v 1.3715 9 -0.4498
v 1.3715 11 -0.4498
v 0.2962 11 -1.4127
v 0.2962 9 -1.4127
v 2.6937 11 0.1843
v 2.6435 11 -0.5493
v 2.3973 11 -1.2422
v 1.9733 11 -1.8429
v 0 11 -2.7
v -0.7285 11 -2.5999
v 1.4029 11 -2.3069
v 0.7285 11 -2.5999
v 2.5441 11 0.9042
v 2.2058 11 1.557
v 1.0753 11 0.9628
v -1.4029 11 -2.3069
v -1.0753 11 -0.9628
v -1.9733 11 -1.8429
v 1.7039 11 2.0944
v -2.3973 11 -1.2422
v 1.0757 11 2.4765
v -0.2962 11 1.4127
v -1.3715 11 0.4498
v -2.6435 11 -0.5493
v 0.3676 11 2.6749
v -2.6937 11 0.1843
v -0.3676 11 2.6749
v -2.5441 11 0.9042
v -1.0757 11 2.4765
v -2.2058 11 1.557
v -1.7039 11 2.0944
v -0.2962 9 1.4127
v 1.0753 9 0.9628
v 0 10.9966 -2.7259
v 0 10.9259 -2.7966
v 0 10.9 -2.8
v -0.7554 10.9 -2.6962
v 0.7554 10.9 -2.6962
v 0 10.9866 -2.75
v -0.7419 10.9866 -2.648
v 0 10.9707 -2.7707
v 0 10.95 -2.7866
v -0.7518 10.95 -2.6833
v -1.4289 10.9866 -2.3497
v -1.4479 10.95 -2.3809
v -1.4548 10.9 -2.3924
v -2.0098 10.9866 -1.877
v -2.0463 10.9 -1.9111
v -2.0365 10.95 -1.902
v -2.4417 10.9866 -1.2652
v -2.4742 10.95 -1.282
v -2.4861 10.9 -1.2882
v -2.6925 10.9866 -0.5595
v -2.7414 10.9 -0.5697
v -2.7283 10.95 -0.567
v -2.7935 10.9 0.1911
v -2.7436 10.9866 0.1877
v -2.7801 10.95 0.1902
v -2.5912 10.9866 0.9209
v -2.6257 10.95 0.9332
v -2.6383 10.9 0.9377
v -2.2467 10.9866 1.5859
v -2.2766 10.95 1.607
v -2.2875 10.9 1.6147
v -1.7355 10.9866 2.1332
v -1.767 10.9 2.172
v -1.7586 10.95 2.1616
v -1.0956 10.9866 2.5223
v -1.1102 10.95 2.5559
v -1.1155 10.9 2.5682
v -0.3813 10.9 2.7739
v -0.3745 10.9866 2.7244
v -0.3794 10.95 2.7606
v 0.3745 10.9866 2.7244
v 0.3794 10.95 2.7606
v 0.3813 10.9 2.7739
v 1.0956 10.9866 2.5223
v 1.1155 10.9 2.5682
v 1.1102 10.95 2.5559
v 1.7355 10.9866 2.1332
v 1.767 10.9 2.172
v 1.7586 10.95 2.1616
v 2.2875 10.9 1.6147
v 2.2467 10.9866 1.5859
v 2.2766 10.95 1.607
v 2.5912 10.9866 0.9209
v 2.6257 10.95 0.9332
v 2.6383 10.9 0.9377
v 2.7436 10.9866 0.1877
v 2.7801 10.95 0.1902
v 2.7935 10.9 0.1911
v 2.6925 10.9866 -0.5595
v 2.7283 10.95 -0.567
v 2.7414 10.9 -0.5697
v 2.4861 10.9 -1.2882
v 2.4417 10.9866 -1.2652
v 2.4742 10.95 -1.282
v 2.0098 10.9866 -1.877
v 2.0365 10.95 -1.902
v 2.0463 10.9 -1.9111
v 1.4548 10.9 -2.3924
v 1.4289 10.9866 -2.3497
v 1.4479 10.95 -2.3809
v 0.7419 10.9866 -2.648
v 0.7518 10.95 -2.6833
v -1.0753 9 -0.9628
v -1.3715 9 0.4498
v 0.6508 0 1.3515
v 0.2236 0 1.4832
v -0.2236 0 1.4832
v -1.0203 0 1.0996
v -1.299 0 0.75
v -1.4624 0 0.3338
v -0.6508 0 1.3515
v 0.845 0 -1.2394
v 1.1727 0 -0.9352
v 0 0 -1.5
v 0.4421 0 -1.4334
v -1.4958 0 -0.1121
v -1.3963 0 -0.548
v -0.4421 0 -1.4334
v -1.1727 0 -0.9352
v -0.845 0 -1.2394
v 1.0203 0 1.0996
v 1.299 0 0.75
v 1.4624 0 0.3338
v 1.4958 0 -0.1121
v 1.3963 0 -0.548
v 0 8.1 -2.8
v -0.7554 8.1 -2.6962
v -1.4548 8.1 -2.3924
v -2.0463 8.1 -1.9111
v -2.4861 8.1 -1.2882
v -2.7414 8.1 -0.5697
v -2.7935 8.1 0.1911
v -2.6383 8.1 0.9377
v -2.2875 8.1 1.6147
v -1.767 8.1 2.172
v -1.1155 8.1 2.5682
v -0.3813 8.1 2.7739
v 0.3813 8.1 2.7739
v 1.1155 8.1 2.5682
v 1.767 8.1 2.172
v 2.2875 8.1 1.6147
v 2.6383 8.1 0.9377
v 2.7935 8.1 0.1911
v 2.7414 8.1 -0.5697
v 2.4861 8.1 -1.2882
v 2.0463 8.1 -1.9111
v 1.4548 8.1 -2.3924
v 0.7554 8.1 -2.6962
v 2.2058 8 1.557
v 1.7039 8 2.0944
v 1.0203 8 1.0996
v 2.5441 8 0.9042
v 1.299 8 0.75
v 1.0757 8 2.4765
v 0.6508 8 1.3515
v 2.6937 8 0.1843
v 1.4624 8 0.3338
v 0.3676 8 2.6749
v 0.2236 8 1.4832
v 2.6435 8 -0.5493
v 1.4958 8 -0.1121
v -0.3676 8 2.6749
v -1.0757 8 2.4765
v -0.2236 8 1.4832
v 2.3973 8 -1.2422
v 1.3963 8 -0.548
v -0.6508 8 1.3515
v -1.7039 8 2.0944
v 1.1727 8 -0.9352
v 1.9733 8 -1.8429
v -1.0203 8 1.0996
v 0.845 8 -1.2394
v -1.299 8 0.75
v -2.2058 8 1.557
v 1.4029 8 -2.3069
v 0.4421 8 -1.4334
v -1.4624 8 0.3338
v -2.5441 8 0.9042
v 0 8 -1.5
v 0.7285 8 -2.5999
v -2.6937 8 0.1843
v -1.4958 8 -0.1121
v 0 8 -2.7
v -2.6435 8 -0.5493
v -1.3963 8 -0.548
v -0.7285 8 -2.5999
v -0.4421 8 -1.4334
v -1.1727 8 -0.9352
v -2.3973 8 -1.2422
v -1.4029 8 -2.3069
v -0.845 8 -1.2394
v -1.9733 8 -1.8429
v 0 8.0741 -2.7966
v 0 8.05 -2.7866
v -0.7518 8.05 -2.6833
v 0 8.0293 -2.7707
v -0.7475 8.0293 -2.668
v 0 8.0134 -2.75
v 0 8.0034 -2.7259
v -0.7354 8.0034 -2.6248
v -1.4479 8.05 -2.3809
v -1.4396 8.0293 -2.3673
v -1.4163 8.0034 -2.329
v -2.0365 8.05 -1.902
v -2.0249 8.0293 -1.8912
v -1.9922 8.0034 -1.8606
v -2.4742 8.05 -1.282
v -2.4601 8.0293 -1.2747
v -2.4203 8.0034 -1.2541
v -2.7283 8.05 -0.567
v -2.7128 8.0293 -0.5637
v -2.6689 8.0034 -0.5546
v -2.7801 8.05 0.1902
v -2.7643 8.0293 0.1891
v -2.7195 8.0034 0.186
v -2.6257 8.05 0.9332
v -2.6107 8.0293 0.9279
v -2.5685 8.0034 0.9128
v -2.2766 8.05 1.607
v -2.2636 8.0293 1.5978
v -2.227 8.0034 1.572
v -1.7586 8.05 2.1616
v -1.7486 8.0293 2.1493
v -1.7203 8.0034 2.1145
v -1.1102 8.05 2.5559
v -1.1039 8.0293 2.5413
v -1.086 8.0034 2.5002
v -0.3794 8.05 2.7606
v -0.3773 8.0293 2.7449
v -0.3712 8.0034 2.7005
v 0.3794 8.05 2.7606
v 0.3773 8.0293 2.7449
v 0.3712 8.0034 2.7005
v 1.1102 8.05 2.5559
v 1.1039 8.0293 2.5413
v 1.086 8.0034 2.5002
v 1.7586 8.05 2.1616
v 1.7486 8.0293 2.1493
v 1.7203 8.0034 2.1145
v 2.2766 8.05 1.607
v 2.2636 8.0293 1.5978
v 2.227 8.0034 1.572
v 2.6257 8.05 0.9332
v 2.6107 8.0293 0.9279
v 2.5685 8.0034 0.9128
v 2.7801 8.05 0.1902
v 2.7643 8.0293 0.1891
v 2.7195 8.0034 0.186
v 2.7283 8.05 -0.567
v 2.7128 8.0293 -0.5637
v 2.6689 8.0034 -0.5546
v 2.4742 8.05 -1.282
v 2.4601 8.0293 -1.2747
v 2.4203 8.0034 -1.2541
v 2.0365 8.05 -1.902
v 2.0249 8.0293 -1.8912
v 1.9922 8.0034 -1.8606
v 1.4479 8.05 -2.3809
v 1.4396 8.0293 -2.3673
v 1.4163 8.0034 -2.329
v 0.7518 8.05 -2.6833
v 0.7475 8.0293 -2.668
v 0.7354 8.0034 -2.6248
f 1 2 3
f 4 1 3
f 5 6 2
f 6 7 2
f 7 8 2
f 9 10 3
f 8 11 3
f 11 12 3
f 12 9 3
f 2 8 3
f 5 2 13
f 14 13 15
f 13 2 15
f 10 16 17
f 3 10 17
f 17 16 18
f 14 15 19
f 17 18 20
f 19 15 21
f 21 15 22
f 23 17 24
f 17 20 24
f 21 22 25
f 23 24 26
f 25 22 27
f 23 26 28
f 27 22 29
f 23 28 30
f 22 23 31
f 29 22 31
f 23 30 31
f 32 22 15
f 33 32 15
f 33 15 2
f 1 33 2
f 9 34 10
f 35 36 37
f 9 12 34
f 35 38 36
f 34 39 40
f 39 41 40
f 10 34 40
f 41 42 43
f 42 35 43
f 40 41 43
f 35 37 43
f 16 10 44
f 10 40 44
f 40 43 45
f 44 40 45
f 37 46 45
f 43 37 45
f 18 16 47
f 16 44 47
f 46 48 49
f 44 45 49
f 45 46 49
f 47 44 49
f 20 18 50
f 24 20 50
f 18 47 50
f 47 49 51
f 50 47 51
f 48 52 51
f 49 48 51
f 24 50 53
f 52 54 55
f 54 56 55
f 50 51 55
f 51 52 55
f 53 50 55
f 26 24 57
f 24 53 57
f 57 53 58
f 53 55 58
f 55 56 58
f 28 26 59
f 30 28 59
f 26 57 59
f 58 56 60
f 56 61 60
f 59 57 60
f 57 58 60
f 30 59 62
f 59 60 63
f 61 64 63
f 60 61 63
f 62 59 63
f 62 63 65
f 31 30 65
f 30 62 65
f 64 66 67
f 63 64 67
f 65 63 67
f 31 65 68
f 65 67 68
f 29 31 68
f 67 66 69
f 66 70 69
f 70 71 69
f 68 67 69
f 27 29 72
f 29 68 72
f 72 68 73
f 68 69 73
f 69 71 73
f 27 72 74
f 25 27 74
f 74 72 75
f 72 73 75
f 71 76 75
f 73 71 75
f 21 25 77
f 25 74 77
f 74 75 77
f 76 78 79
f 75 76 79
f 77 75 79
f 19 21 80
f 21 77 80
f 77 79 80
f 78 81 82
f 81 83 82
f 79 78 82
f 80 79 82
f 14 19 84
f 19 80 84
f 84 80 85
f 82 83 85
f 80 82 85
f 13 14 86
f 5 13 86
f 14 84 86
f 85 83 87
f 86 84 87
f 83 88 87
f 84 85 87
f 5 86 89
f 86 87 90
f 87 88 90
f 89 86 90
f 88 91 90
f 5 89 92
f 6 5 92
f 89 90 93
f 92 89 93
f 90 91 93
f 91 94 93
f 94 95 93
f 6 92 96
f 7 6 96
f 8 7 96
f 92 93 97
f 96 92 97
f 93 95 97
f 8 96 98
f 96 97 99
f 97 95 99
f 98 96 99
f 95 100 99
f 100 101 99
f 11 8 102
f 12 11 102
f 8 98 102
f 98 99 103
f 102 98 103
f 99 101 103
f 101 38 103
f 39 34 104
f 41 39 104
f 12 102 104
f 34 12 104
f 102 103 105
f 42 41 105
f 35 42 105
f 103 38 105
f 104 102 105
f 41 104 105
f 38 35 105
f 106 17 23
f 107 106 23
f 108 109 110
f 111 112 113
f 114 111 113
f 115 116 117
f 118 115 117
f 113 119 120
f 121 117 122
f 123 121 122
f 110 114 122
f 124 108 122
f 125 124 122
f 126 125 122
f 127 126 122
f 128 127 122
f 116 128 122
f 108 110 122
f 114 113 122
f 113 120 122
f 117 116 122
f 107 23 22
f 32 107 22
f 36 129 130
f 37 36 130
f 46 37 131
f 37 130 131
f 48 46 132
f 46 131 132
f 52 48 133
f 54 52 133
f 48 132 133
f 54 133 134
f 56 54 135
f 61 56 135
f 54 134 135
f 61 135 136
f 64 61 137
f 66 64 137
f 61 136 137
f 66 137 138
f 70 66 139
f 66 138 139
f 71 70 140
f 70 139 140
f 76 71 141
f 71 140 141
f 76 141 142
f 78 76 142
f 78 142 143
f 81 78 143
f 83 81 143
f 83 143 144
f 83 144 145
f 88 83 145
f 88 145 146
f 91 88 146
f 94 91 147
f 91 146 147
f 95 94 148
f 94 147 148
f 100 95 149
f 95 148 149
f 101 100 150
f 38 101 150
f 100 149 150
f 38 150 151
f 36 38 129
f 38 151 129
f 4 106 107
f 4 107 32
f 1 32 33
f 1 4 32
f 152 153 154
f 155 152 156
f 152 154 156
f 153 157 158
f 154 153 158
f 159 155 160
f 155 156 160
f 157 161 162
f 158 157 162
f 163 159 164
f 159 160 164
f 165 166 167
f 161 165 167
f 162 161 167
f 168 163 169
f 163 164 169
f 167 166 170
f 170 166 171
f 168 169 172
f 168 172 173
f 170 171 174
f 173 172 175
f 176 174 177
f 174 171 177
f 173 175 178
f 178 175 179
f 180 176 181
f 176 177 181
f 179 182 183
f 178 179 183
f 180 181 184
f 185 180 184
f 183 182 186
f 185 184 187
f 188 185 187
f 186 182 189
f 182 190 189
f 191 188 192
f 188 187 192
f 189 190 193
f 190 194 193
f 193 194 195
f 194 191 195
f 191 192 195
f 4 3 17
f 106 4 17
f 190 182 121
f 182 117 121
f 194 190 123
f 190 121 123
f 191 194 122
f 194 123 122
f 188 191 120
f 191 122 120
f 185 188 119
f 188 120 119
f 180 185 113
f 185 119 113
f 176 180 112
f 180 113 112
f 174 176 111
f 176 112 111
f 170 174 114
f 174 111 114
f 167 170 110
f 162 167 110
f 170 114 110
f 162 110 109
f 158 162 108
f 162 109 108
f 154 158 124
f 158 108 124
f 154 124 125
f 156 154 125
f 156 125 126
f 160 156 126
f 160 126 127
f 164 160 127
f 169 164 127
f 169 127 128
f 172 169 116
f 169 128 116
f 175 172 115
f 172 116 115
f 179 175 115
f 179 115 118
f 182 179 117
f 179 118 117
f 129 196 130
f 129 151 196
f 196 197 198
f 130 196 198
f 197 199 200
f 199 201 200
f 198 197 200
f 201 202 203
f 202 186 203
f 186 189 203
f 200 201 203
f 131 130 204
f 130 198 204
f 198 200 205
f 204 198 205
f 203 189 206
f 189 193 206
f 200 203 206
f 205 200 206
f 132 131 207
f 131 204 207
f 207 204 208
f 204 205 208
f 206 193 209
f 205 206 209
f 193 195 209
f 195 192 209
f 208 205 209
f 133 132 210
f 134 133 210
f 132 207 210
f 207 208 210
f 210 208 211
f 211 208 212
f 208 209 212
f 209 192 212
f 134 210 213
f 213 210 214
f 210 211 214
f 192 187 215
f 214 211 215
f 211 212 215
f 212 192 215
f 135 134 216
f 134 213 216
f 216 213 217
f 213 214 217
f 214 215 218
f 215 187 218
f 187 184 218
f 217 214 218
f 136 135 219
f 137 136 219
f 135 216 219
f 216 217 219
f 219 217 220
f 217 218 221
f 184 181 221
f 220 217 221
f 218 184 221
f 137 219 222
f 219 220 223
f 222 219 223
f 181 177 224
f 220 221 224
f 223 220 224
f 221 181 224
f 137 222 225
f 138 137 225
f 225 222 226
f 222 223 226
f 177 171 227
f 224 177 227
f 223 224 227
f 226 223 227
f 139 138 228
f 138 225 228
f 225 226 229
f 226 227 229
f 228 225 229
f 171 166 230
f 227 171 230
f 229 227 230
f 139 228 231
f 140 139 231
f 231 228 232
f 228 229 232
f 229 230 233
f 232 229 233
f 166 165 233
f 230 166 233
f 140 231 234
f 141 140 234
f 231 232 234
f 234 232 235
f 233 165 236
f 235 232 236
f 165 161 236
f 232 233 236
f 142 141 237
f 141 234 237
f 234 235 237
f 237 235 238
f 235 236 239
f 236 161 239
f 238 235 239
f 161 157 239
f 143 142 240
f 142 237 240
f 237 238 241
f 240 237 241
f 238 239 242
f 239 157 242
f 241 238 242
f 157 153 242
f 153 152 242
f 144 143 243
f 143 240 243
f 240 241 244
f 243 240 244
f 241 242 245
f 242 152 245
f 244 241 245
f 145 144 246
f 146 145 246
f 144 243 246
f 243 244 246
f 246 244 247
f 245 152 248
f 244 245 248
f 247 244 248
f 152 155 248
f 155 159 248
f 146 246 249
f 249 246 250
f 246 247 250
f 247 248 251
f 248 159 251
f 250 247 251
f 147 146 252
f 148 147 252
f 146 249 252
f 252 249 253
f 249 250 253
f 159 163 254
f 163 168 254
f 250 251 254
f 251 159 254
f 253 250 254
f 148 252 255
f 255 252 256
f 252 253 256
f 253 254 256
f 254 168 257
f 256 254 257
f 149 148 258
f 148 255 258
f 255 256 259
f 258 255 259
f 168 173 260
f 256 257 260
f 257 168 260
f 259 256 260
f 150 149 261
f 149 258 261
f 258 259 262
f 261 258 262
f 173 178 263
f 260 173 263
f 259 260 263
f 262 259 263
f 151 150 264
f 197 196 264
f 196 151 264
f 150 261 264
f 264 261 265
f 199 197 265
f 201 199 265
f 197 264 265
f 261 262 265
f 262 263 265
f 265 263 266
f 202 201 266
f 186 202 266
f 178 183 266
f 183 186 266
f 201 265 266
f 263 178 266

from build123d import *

# Parameters (mm, degrees)
CUT_EXTRUDE_1_DEPTH = 2
FILLET_1_R          = 0.1


with BuildPart() as part:
    # 草图1 → 旋转1 (revolve)
    with BuildSketch(Plane.XY, mode=Mode.PRIVATE) as revolve_1_sk:
        Polygon((0, 0), (0, 11), (2.8, 11), (2.8, 8), (1.5, 8), (1.5, 0), align=None)
    revolve(revolve_1_sk.sketch.rotate(Axis((0, 0, 0), (0, 1, 0)), 90), axis=Axis((0, 0, 0), (0, 1, 0)))

    # 草图2 → 切除-拉伸1 (cut)
    with BuildSketch(Plane(origin=(0, 11, 0), x_dir=(1, 0, 0), z_dir=(0, 1, 0))):
        Polygon((1.075295482, -0.962846281), (1.37149708, 0.449810063), (0.296201598, 1.412656344), (-1.075295482, 0.962846281), (-1.37149708, -0.449810063), (-0.296201598, -1.412656344), align=None)
    extrude(amount=-CUT_EXTRUDE_1_DEPTH, mode=Mode.SUBTRACT)

    # 圆角1
    fillet_1_edges = [part.edges().sort_by_distance(p)[0] for p in [
        (0, 8, 2.8),
        (0, 11, 2.8),
    ]]
    fillet(fillet_1_edges, radius=FILLET_1_R)


solid = part.part
